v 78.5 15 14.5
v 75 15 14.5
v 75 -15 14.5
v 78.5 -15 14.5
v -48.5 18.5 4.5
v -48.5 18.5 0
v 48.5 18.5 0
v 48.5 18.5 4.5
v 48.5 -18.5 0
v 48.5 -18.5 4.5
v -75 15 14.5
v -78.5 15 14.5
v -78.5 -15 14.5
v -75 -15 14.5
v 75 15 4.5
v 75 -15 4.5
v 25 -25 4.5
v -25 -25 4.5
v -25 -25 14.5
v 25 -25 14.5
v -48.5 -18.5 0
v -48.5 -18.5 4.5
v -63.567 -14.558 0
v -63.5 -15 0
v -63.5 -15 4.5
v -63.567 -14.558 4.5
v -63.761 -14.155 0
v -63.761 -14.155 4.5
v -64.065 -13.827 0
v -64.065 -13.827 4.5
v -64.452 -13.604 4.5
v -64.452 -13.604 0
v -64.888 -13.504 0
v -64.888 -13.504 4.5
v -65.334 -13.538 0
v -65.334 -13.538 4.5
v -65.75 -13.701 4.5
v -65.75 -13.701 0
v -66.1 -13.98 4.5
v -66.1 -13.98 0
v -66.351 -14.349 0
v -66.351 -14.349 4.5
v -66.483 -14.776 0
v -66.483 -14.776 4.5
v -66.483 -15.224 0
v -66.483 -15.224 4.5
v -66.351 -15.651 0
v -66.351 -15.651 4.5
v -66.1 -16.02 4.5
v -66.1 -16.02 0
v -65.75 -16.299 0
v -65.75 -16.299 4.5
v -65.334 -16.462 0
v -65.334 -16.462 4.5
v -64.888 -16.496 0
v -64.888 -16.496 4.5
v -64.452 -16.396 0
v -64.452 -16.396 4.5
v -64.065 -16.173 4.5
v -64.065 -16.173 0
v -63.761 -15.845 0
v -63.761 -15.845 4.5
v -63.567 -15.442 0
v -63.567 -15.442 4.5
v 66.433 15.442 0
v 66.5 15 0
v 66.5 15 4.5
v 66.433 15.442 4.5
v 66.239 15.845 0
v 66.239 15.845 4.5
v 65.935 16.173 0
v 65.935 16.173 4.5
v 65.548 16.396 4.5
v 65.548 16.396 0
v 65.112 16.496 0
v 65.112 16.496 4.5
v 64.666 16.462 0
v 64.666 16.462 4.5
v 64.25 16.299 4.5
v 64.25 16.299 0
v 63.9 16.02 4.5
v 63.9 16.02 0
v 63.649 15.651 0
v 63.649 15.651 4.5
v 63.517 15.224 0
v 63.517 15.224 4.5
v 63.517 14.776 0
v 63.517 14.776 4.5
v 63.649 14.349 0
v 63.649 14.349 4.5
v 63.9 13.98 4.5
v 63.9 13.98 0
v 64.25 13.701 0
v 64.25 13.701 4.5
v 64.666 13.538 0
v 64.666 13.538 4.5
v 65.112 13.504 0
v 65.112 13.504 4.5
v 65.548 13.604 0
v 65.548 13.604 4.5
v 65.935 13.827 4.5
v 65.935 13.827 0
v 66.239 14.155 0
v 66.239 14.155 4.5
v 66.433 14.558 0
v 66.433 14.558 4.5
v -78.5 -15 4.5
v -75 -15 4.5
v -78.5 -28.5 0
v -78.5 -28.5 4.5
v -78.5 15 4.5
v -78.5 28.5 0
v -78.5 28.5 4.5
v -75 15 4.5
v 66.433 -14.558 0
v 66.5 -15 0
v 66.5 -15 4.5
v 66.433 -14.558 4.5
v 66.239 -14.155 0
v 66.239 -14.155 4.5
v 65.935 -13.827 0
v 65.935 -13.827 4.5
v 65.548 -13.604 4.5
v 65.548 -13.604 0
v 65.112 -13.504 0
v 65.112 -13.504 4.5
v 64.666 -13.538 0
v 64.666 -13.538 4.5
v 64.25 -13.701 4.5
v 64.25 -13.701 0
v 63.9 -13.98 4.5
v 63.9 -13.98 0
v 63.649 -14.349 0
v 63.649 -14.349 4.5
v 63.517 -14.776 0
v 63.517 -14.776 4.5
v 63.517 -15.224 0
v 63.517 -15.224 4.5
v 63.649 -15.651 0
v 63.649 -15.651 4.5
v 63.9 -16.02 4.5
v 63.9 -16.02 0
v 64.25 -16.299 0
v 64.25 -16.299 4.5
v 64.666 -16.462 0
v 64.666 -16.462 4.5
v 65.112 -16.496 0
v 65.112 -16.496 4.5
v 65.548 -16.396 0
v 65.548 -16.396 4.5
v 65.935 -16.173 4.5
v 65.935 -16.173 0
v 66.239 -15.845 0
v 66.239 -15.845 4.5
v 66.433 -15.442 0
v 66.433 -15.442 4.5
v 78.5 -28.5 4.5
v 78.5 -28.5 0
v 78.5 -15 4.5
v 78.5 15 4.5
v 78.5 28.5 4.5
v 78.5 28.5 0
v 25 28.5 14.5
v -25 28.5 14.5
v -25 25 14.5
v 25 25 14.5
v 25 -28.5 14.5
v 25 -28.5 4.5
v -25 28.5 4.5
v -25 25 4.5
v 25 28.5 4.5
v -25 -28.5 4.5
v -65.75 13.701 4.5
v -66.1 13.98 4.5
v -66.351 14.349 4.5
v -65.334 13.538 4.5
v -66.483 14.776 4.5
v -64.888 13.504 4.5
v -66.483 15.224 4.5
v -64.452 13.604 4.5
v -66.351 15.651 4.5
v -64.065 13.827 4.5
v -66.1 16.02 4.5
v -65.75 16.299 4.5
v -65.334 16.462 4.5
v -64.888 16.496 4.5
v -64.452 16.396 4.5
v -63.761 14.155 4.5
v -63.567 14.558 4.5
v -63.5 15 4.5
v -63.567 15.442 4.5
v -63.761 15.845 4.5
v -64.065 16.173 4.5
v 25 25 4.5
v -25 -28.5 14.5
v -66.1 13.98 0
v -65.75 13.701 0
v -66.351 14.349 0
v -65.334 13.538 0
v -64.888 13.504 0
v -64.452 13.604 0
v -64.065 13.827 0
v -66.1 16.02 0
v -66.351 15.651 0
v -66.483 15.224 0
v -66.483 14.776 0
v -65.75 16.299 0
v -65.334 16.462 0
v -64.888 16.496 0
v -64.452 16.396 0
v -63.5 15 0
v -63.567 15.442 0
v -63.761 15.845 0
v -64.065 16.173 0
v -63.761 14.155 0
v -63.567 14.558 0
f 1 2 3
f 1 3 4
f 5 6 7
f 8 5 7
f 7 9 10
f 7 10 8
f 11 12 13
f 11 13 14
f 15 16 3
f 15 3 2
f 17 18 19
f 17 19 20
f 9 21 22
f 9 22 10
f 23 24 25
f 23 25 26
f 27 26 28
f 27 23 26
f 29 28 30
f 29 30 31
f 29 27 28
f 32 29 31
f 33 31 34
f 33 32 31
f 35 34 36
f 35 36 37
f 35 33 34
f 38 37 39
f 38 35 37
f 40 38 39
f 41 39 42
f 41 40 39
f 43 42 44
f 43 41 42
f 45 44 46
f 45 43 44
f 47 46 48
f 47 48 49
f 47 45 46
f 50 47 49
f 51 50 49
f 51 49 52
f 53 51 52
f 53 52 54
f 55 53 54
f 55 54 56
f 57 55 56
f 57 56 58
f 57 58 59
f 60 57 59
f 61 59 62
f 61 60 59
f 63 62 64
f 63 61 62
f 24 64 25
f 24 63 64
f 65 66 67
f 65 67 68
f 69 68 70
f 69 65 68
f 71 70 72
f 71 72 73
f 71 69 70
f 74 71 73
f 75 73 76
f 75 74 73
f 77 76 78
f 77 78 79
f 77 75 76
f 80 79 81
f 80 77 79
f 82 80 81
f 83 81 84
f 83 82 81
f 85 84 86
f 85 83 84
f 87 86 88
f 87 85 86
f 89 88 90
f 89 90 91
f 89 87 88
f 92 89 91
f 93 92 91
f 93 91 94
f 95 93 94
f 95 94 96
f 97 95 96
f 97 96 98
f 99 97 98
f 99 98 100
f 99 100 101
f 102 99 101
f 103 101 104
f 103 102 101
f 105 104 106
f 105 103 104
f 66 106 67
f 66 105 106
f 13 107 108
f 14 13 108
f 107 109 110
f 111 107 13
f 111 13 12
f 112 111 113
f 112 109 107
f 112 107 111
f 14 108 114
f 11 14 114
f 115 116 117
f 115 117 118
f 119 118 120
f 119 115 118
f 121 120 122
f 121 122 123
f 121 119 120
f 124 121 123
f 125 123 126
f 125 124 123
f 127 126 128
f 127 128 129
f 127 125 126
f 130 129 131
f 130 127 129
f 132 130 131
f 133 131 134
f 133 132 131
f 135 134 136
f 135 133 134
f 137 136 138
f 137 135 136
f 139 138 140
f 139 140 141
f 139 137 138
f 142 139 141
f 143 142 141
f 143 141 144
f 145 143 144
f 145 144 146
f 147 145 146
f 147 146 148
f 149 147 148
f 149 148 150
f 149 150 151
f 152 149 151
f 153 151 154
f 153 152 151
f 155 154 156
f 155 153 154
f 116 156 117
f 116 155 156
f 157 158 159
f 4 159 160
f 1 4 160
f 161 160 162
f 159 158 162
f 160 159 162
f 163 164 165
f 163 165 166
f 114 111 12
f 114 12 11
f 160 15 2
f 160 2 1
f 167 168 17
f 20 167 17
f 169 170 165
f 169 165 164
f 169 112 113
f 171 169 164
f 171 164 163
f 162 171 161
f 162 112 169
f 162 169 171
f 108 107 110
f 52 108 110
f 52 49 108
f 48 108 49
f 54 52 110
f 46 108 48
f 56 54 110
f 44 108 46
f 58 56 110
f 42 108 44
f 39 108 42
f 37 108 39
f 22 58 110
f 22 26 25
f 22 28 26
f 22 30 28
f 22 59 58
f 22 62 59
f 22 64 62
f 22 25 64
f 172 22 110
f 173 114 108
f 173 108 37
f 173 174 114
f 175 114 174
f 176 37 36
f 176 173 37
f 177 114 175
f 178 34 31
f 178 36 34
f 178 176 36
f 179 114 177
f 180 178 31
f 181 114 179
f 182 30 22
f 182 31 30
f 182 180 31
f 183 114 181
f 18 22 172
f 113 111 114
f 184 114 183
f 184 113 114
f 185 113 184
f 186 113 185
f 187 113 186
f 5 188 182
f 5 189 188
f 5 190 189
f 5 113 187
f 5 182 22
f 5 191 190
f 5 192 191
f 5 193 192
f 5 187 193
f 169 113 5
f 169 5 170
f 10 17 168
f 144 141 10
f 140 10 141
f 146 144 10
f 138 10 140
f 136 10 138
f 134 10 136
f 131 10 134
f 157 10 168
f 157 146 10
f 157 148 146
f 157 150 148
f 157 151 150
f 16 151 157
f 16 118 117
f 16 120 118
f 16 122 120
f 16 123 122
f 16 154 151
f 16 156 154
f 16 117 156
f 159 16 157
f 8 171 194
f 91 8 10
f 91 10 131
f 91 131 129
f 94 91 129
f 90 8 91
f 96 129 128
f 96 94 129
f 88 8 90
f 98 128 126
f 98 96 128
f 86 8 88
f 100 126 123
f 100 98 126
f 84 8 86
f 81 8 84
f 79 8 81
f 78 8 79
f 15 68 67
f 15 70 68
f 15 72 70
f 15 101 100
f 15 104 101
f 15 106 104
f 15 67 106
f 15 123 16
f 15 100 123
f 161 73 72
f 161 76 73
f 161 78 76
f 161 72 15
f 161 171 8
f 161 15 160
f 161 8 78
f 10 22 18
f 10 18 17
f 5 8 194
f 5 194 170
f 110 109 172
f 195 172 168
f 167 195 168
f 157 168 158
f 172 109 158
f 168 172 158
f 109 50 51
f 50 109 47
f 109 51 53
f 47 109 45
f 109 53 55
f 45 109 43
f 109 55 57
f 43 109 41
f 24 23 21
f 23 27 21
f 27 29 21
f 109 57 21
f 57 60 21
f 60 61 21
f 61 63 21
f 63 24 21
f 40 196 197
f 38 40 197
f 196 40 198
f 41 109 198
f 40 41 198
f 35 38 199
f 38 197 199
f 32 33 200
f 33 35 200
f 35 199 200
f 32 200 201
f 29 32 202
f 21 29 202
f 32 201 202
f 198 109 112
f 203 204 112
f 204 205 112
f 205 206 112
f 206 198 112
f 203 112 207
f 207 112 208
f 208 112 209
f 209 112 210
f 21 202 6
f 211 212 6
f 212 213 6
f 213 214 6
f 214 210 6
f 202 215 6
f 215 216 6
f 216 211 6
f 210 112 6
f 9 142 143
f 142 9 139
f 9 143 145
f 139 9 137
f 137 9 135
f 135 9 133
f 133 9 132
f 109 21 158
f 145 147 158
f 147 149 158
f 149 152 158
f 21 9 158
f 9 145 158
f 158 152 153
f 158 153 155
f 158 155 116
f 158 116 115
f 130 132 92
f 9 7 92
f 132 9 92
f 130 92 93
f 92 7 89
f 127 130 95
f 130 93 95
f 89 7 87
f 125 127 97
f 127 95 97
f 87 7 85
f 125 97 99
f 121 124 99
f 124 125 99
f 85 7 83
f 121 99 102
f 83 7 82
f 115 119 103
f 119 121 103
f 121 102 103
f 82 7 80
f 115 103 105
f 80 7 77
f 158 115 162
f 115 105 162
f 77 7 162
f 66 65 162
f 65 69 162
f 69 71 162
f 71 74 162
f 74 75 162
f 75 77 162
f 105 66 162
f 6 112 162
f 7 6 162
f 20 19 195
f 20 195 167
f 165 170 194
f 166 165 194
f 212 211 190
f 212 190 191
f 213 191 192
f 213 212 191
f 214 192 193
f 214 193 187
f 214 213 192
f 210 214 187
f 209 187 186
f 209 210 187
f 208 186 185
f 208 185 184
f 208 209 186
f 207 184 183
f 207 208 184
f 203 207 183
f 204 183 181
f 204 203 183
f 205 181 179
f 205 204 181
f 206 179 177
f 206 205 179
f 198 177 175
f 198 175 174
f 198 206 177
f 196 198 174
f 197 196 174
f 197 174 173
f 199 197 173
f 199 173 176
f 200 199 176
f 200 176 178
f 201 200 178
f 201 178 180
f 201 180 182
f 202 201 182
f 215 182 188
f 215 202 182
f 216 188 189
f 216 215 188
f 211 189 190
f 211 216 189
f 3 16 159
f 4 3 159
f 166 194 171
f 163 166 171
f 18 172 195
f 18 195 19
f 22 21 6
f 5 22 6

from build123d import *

# Parameters (mm, degrees)
SKETCH_1_W      = 157
SKETCH_1_H      = 57
SKETCH_1_R      = 1.5
SKETCH_1_W_2    = 97
SKETCH_1_H_2    = 37
EXTRUDE_1_DEPTH = 4.5
SKETCH_2_W      = 3.5
SKETCH_2_H      = 30
SKETCH_2_W_2    = 50
SKETCH_2_H_2    = 3.5
EXTRUDE_2_DEPTH = 10


with BuildPart() as part:
    # 草图1 → 凸台-拉伸1 (new body)
    with BuildSketch(Plane.XY):
        Rectangle(SKETCH_1_W, SKETCH_1_H)
        with Locations((-65, 15)):
            Circle(SKETCH_1_R, mode=Mode.SUBTRACT)
        with Locations((65, 15)):
            Circle(SKETCH_1_R, mode=Mode.SUBTRACT)
        with Locations((-65, -15)):
            Circle(SKETCH_1_R, mode=Mode.SUBTRACT)
        with Locations((65, -15)):
            Circle(SKETCH_1_R, mode=Mode.SUBTRACT)
        Rectangle(SKETCH_1_W_2, SKETCH_1_H_2, mode=Mode.SUBTRACT)
    extrude(amount=EXTRUDE_1_DEPTH)

    # 草图2 → 凸台-拉伸2 (add)
    with BuildSketch(Plane.XY.offset(4.5)):
        with Locations((-76.75, 0)):
            Rectangle(SKETCH_2_W, SKETCH_2_H)
        with Locations((76.75, 0)):
            Rectangle(SKETCH_2_W, SKETCH_2_H)
        with Locations((0, 26.75)):
            Rectangle(SKETCH_2_W_2, SKETCH_2_H_2)
        with Locations((0, -26.75)):
            Rectangle(SKETCH_2_W_2, SKETCH_2_H_2)
    extrude(amount=EXTRUDE_2_DEPTH)


solid = part.part
